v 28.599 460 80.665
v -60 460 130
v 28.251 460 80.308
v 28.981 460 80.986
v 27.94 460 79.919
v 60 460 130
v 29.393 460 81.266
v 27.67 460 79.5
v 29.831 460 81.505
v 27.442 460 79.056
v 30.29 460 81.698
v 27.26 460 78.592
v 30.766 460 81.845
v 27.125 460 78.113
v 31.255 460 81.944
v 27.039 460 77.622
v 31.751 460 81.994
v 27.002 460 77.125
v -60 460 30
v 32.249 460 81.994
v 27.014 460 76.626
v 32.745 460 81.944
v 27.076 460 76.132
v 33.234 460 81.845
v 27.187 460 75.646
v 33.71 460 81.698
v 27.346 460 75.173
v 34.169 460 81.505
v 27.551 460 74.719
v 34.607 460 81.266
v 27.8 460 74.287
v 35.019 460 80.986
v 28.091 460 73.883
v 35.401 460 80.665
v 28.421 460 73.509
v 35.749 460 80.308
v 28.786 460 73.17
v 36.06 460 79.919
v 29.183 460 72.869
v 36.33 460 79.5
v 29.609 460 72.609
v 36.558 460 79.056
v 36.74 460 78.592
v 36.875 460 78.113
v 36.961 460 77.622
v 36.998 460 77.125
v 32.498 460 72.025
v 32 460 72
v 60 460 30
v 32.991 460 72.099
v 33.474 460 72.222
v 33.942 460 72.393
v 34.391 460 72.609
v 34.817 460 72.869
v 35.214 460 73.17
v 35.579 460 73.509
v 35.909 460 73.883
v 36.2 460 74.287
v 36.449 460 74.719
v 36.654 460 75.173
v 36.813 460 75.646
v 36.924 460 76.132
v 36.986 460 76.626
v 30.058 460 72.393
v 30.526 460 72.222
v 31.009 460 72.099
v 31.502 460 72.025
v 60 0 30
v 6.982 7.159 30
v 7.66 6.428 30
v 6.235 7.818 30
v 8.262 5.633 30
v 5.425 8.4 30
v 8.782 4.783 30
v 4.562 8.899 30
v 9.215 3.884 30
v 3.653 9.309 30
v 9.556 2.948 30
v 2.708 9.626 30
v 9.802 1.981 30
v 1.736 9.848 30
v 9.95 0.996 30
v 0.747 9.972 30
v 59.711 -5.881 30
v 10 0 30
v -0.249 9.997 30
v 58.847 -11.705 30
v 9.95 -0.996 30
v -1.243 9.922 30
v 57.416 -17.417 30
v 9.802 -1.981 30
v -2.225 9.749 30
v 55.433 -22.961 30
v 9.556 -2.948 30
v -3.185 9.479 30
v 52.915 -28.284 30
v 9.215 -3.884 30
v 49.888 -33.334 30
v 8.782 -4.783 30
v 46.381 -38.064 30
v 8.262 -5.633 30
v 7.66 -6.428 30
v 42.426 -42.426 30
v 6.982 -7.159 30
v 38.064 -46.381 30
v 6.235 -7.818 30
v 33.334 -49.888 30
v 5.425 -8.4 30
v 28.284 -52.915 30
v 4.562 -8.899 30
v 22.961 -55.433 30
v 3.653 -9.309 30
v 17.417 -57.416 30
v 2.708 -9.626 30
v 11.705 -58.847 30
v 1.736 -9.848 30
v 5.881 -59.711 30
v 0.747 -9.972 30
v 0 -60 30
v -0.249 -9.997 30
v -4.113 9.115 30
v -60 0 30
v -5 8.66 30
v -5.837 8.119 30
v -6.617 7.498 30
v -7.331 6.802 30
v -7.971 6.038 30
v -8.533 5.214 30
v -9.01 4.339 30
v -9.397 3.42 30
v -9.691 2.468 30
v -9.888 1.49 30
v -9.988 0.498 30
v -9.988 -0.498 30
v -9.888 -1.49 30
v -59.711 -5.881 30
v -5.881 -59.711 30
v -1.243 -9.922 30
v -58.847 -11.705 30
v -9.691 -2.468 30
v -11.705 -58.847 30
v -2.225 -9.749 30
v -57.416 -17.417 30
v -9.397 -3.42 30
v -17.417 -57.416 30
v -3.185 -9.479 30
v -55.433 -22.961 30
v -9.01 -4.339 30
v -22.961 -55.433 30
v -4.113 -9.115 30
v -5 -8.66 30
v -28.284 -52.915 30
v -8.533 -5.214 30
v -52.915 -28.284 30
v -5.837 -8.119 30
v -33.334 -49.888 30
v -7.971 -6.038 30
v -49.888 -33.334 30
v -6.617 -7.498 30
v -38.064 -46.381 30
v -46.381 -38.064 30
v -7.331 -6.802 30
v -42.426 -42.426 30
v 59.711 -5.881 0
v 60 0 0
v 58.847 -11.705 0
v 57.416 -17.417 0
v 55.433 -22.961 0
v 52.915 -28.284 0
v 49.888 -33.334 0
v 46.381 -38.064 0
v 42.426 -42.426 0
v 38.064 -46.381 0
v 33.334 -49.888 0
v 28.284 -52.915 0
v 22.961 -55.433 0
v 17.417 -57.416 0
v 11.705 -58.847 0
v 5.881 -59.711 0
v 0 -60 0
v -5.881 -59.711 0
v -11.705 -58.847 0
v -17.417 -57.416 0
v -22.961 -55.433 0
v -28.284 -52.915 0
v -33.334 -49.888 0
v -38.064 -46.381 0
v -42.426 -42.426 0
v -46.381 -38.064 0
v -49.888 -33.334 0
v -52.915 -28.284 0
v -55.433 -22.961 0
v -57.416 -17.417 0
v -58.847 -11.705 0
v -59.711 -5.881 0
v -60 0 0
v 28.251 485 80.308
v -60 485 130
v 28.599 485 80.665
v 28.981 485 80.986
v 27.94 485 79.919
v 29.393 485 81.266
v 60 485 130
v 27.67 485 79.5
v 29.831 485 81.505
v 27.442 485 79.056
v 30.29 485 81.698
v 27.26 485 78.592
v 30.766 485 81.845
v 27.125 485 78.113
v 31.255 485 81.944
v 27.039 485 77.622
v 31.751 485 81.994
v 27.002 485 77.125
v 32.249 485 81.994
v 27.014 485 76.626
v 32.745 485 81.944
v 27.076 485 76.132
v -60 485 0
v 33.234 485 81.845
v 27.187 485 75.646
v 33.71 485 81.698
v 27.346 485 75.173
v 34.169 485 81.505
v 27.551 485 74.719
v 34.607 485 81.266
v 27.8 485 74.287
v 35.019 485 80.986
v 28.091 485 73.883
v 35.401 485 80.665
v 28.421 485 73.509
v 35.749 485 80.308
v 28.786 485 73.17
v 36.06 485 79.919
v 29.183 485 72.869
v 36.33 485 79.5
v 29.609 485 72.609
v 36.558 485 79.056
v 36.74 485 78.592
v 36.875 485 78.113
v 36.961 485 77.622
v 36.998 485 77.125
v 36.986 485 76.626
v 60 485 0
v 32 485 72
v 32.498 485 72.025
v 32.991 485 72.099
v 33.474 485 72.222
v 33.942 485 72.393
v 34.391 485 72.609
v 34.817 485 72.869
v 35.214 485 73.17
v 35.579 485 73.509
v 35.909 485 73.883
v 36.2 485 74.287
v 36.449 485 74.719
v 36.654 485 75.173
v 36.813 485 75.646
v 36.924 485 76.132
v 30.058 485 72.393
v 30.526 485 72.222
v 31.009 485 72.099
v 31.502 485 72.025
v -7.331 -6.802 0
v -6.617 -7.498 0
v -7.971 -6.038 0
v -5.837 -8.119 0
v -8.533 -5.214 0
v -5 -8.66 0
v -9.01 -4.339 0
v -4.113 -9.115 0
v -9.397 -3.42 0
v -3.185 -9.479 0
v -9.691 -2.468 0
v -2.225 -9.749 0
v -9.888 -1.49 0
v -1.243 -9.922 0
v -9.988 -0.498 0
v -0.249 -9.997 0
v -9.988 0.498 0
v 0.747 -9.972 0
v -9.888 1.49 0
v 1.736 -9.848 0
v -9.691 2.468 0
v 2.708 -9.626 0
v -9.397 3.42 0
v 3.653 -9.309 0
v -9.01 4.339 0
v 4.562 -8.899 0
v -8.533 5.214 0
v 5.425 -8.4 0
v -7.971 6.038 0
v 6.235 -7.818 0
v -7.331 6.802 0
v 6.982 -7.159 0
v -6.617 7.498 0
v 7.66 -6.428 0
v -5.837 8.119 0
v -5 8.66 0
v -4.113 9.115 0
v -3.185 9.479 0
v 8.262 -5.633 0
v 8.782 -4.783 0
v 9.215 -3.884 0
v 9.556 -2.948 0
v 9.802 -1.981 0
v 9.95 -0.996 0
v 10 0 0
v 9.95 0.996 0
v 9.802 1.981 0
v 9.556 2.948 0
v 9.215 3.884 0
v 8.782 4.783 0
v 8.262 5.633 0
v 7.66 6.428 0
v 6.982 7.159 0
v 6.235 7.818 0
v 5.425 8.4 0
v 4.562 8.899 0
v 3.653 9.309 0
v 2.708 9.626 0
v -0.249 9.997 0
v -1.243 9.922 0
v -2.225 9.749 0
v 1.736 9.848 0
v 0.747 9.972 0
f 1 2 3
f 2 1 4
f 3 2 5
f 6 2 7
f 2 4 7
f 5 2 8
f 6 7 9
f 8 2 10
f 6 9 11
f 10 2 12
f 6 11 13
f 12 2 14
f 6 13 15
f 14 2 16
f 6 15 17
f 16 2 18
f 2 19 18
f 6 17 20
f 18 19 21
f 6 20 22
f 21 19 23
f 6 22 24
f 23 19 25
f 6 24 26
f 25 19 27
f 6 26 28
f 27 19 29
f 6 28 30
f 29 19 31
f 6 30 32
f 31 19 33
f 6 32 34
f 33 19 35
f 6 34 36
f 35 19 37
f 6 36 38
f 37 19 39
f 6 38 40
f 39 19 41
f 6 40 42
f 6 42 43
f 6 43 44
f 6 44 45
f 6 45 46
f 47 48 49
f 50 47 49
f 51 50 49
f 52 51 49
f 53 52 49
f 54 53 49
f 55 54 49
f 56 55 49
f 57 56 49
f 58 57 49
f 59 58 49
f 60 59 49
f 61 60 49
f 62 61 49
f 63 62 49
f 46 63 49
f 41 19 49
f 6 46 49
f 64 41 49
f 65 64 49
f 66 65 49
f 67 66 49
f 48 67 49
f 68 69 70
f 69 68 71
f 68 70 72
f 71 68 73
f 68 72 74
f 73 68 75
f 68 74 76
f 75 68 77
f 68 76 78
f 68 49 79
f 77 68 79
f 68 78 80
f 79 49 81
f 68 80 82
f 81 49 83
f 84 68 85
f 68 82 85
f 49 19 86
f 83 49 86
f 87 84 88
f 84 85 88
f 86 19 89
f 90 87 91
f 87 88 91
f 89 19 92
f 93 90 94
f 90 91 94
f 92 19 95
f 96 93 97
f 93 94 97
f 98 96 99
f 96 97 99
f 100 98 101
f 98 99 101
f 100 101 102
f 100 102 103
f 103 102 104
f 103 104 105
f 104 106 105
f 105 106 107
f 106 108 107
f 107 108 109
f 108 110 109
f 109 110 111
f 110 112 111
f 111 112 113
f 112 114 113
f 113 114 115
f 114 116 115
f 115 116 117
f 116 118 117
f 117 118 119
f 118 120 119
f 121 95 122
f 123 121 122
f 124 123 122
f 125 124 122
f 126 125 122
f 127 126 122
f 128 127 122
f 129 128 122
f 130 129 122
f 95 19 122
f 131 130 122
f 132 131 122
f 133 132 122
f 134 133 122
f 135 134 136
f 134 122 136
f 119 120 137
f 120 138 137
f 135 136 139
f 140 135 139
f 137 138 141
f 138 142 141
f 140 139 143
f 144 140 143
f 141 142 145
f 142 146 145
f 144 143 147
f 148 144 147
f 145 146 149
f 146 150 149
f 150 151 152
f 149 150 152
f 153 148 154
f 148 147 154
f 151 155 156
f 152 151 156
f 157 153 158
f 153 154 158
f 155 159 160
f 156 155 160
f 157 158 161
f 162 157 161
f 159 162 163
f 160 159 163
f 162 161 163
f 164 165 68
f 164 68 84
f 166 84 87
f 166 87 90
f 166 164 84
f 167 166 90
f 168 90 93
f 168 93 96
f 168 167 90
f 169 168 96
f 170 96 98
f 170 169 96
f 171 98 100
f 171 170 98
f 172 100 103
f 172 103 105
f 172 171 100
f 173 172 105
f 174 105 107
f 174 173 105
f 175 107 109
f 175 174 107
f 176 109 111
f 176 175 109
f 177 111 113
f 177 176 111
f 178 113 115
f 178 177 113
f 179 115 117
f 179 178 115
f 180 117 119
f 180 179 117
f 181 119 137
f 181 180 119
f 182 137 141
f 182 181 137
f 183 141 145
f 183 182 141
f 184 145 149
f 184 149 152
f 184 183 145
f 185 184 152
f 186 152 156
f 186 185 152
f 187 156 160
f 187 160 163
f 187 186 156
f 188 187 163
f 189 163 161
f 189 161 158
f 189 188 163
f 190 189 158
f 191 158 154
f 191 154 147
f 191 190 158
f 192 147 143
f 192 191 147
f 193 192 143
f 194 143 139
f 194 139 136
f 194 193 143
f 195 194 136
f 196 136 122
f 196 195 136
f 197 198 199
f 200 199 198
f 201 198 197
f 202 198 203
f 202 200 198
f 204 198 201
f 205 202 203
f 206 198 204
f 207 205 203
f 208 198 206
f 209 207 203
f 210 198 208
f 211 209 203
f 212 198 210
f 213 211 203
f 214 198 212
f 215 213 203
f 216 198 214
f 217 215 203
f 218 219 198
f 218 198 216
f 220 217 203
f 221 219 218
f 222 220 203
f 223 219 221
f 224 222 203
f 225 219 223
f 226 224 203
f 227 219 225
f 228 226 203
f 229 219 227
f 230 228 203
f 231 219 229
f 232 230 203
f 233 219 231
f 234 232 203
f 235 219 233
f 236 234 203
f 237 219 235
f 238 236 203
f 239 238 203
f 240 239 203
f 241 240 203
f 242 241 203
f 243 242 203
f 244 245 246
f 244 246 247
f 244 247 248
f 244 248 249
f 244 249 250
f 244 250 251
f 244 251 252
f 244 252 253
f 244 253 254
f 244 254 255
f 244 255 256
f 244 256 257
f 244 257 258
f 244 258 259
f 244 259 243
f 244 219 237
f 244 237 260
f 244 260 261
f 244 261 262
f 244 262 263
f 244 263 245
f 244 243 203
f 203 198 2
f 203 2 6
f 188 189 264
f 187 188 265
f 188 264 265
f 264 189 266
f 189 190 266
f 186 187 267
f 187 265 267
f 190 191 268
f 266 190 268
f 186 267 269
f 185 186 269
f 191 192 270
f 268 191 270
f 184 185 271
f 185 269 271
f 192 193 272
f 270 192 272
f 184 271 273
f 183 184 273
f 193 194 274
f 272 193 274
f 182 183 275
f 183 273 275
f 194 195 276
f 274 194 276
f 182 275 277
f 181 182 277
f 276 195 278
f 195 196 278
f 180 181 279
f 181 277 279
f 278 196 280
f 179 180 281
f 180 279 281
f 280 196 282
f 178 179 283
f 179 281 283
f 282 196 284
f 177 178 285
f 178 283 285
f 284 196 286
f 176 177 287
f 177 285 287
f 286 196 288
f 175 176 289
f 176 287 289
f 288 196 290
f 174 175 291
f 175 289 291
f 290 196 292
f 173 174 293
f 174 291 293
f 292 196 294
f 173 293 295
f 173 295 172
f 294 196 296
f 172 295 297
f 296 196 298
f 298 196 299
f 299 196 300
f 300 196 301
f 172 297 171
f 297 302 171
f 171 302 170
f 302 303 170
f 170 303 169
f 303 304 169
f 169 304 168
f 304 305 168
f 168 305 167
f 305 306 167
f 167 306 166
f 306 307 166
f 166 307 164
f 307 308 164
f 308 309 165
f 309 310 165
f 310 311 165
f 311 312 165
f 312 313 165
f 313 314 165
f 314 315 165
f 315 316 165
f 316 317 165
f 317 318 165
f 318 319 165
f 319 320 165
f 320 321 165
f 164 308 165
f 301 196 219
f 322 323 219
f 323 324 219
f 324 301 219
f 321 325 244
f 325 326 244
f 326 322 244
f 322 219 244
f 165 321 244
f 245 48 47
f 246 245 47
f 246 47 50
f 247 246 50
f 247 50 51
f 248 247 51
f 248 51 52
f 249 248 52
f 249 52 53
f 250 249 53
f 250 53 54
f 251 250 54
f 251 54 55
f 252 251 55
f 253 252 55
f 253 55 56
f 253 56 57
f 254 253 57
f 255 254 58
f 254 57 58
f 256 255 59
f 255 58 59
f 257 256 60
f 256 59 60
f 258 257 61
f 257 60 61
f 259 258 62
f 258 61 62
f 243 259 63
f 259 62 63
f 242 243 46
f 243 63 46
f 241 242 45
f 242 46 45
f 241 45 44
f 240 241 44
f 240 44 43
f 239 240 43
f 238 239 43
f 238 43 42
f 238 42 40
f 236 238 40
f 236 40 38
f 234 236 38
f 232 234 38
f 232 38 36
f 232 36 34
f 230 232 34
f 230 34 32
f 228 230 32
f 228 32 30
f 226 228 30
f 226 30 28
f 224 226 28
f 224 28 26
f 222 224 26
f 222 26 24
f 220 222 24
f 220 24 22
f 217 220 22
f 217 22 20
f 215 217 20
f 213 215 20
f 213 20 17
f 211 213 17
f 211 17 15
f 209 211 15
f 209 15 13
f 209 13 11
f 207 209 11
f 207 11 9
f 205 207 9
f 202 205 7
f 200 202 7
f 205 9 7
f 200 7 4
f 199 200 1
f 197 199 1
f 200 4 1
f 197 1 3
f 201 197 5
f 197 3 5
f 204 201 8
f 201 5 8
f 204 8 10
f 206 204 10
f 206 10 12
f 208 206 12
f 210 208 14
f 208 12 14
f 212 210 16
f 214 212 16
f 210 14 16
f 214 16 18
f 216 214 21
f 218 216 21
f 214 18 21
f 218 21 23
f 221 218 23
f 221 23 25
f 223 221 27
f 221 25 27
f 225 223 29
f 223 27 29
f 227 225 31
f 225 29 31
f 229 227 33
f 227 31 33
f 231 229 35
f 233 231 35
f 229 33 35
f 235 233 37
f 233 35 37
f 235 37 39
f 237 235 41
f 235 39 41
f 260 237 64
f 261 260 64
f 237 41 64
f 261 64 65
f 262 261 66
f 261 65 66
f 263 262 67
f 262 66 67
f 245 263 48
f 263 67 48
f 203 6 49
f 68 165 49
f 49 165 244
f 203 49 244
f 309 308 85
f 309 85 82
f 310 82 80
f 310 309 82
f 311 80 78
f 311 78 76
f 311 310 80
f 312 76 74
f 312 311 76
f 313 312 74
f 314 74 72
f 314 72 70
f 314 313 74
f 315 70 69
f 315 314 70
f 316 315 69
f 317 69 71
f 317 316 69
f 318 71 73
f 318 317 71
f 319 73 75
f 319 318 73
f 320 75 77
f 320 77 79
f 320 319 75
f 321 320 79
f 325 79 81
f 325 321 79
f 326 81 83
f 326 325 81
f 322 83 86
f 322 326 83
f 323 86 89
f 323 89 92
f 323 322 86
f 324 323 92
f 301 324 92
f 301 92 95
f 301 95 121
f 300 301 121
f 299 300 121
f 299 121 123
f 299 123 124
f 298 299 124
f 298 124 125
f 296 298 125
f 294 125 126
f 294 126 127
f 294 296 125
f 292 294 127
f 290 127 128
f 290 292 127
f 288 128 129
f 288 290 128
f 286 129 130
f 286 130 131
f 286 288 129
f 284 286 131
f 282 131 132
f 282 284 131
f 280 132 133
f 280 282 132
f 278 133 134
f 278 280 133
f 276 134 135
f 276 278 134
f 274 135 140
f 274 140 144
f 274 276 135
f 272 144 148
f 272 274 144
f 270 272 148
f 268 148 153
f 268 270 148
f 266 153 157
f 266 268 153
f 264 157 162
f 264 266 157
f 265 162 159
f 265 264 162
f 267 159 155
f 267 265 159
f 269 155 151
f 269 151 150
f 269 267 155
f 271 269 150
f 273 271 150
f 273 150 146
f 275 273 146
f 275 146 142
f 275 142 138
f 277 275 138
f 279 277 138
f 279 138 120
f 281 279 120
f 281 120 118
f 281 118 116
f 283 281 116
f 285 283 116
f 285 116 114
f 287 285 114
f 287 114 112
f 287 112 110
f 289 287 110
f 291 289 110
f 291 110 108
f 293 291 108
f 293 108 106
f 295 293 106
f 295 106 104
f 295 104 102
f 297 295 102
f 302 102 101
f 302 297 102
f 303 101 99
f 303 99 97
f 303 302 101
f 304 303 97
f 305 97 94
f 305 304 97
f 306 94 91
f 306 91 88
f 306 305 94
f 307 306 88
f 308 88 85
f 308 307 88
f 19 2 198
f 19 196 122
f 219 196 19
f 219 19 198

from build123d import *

# Parameters (mm, degrees)
SKETCH1_R                = 10
BOSS_EXTRUDE1_DEPTH      = 30
BOSS_EXTRUDE2_DEPTH      = 100
BOSS_EXTRUDE2_DEPTH_BACK = 30
SKETCH2_W                = 120
SKETCH2_H                = 25
SKETCH3_R                = 5
CUT_EXTRUDE1_DEPTH       = 70


with BuildPart() as part:
    # Sketch1 → Boss-Extrude1 (new body)
    with BuildSketch(Plane(origin=(0, 0, 0), x_dir=(0, 1, 0), z_dir=(0, 0, 1))):
        with BuildLine():
            Line((0, 60), (400, 60))
            Line((400, 60), (460, 60))
            Line((460, 60), (460, -60))
            Line((460, -60), (400, -60))
            Line((400, -60), (0, -60))
            ThreePointArc((0, -60), (-60, 0), (0, 60))
        make_face()
        with Locations(Location((0, 0, 0), (0, 0, 270))):
            Circle(SKETCH1_R, mode=Mode.SUBTRACT)
    extrude(amount=BOSS_EXTRUDE1_DEPTH)

    # Sketch2 → Boss-Extrude2 (add, two sides: drawn at the far end of the back side and taken through both)
    with BuildSketch(Plane.XY.offset(30).offset(-BOSS_EXTRUDE2_DEPTH_BACK)):
        with Locations((0, 472.5)):
            Rectangle(SKETCH2_W, SKETCH2_H)
    extrude(amount=BOSS_EXTRUDE2_DEPTH + BOSS_EXTRUDE2_DEPTH_BACK)

    # Sketch3 → Cut-Extrude1 (cut)
    with BuildSketch(Plane.XZ.offset(-460)):
        with Locations(Location((32, 77, 0), (0, 0, 270))):
            Circle(SKETCH3_R)
    extrude(amount=-CUT_EXTRUDE1_DEPTH, mode=Mode.SUBTRACT)


solid = part.part
